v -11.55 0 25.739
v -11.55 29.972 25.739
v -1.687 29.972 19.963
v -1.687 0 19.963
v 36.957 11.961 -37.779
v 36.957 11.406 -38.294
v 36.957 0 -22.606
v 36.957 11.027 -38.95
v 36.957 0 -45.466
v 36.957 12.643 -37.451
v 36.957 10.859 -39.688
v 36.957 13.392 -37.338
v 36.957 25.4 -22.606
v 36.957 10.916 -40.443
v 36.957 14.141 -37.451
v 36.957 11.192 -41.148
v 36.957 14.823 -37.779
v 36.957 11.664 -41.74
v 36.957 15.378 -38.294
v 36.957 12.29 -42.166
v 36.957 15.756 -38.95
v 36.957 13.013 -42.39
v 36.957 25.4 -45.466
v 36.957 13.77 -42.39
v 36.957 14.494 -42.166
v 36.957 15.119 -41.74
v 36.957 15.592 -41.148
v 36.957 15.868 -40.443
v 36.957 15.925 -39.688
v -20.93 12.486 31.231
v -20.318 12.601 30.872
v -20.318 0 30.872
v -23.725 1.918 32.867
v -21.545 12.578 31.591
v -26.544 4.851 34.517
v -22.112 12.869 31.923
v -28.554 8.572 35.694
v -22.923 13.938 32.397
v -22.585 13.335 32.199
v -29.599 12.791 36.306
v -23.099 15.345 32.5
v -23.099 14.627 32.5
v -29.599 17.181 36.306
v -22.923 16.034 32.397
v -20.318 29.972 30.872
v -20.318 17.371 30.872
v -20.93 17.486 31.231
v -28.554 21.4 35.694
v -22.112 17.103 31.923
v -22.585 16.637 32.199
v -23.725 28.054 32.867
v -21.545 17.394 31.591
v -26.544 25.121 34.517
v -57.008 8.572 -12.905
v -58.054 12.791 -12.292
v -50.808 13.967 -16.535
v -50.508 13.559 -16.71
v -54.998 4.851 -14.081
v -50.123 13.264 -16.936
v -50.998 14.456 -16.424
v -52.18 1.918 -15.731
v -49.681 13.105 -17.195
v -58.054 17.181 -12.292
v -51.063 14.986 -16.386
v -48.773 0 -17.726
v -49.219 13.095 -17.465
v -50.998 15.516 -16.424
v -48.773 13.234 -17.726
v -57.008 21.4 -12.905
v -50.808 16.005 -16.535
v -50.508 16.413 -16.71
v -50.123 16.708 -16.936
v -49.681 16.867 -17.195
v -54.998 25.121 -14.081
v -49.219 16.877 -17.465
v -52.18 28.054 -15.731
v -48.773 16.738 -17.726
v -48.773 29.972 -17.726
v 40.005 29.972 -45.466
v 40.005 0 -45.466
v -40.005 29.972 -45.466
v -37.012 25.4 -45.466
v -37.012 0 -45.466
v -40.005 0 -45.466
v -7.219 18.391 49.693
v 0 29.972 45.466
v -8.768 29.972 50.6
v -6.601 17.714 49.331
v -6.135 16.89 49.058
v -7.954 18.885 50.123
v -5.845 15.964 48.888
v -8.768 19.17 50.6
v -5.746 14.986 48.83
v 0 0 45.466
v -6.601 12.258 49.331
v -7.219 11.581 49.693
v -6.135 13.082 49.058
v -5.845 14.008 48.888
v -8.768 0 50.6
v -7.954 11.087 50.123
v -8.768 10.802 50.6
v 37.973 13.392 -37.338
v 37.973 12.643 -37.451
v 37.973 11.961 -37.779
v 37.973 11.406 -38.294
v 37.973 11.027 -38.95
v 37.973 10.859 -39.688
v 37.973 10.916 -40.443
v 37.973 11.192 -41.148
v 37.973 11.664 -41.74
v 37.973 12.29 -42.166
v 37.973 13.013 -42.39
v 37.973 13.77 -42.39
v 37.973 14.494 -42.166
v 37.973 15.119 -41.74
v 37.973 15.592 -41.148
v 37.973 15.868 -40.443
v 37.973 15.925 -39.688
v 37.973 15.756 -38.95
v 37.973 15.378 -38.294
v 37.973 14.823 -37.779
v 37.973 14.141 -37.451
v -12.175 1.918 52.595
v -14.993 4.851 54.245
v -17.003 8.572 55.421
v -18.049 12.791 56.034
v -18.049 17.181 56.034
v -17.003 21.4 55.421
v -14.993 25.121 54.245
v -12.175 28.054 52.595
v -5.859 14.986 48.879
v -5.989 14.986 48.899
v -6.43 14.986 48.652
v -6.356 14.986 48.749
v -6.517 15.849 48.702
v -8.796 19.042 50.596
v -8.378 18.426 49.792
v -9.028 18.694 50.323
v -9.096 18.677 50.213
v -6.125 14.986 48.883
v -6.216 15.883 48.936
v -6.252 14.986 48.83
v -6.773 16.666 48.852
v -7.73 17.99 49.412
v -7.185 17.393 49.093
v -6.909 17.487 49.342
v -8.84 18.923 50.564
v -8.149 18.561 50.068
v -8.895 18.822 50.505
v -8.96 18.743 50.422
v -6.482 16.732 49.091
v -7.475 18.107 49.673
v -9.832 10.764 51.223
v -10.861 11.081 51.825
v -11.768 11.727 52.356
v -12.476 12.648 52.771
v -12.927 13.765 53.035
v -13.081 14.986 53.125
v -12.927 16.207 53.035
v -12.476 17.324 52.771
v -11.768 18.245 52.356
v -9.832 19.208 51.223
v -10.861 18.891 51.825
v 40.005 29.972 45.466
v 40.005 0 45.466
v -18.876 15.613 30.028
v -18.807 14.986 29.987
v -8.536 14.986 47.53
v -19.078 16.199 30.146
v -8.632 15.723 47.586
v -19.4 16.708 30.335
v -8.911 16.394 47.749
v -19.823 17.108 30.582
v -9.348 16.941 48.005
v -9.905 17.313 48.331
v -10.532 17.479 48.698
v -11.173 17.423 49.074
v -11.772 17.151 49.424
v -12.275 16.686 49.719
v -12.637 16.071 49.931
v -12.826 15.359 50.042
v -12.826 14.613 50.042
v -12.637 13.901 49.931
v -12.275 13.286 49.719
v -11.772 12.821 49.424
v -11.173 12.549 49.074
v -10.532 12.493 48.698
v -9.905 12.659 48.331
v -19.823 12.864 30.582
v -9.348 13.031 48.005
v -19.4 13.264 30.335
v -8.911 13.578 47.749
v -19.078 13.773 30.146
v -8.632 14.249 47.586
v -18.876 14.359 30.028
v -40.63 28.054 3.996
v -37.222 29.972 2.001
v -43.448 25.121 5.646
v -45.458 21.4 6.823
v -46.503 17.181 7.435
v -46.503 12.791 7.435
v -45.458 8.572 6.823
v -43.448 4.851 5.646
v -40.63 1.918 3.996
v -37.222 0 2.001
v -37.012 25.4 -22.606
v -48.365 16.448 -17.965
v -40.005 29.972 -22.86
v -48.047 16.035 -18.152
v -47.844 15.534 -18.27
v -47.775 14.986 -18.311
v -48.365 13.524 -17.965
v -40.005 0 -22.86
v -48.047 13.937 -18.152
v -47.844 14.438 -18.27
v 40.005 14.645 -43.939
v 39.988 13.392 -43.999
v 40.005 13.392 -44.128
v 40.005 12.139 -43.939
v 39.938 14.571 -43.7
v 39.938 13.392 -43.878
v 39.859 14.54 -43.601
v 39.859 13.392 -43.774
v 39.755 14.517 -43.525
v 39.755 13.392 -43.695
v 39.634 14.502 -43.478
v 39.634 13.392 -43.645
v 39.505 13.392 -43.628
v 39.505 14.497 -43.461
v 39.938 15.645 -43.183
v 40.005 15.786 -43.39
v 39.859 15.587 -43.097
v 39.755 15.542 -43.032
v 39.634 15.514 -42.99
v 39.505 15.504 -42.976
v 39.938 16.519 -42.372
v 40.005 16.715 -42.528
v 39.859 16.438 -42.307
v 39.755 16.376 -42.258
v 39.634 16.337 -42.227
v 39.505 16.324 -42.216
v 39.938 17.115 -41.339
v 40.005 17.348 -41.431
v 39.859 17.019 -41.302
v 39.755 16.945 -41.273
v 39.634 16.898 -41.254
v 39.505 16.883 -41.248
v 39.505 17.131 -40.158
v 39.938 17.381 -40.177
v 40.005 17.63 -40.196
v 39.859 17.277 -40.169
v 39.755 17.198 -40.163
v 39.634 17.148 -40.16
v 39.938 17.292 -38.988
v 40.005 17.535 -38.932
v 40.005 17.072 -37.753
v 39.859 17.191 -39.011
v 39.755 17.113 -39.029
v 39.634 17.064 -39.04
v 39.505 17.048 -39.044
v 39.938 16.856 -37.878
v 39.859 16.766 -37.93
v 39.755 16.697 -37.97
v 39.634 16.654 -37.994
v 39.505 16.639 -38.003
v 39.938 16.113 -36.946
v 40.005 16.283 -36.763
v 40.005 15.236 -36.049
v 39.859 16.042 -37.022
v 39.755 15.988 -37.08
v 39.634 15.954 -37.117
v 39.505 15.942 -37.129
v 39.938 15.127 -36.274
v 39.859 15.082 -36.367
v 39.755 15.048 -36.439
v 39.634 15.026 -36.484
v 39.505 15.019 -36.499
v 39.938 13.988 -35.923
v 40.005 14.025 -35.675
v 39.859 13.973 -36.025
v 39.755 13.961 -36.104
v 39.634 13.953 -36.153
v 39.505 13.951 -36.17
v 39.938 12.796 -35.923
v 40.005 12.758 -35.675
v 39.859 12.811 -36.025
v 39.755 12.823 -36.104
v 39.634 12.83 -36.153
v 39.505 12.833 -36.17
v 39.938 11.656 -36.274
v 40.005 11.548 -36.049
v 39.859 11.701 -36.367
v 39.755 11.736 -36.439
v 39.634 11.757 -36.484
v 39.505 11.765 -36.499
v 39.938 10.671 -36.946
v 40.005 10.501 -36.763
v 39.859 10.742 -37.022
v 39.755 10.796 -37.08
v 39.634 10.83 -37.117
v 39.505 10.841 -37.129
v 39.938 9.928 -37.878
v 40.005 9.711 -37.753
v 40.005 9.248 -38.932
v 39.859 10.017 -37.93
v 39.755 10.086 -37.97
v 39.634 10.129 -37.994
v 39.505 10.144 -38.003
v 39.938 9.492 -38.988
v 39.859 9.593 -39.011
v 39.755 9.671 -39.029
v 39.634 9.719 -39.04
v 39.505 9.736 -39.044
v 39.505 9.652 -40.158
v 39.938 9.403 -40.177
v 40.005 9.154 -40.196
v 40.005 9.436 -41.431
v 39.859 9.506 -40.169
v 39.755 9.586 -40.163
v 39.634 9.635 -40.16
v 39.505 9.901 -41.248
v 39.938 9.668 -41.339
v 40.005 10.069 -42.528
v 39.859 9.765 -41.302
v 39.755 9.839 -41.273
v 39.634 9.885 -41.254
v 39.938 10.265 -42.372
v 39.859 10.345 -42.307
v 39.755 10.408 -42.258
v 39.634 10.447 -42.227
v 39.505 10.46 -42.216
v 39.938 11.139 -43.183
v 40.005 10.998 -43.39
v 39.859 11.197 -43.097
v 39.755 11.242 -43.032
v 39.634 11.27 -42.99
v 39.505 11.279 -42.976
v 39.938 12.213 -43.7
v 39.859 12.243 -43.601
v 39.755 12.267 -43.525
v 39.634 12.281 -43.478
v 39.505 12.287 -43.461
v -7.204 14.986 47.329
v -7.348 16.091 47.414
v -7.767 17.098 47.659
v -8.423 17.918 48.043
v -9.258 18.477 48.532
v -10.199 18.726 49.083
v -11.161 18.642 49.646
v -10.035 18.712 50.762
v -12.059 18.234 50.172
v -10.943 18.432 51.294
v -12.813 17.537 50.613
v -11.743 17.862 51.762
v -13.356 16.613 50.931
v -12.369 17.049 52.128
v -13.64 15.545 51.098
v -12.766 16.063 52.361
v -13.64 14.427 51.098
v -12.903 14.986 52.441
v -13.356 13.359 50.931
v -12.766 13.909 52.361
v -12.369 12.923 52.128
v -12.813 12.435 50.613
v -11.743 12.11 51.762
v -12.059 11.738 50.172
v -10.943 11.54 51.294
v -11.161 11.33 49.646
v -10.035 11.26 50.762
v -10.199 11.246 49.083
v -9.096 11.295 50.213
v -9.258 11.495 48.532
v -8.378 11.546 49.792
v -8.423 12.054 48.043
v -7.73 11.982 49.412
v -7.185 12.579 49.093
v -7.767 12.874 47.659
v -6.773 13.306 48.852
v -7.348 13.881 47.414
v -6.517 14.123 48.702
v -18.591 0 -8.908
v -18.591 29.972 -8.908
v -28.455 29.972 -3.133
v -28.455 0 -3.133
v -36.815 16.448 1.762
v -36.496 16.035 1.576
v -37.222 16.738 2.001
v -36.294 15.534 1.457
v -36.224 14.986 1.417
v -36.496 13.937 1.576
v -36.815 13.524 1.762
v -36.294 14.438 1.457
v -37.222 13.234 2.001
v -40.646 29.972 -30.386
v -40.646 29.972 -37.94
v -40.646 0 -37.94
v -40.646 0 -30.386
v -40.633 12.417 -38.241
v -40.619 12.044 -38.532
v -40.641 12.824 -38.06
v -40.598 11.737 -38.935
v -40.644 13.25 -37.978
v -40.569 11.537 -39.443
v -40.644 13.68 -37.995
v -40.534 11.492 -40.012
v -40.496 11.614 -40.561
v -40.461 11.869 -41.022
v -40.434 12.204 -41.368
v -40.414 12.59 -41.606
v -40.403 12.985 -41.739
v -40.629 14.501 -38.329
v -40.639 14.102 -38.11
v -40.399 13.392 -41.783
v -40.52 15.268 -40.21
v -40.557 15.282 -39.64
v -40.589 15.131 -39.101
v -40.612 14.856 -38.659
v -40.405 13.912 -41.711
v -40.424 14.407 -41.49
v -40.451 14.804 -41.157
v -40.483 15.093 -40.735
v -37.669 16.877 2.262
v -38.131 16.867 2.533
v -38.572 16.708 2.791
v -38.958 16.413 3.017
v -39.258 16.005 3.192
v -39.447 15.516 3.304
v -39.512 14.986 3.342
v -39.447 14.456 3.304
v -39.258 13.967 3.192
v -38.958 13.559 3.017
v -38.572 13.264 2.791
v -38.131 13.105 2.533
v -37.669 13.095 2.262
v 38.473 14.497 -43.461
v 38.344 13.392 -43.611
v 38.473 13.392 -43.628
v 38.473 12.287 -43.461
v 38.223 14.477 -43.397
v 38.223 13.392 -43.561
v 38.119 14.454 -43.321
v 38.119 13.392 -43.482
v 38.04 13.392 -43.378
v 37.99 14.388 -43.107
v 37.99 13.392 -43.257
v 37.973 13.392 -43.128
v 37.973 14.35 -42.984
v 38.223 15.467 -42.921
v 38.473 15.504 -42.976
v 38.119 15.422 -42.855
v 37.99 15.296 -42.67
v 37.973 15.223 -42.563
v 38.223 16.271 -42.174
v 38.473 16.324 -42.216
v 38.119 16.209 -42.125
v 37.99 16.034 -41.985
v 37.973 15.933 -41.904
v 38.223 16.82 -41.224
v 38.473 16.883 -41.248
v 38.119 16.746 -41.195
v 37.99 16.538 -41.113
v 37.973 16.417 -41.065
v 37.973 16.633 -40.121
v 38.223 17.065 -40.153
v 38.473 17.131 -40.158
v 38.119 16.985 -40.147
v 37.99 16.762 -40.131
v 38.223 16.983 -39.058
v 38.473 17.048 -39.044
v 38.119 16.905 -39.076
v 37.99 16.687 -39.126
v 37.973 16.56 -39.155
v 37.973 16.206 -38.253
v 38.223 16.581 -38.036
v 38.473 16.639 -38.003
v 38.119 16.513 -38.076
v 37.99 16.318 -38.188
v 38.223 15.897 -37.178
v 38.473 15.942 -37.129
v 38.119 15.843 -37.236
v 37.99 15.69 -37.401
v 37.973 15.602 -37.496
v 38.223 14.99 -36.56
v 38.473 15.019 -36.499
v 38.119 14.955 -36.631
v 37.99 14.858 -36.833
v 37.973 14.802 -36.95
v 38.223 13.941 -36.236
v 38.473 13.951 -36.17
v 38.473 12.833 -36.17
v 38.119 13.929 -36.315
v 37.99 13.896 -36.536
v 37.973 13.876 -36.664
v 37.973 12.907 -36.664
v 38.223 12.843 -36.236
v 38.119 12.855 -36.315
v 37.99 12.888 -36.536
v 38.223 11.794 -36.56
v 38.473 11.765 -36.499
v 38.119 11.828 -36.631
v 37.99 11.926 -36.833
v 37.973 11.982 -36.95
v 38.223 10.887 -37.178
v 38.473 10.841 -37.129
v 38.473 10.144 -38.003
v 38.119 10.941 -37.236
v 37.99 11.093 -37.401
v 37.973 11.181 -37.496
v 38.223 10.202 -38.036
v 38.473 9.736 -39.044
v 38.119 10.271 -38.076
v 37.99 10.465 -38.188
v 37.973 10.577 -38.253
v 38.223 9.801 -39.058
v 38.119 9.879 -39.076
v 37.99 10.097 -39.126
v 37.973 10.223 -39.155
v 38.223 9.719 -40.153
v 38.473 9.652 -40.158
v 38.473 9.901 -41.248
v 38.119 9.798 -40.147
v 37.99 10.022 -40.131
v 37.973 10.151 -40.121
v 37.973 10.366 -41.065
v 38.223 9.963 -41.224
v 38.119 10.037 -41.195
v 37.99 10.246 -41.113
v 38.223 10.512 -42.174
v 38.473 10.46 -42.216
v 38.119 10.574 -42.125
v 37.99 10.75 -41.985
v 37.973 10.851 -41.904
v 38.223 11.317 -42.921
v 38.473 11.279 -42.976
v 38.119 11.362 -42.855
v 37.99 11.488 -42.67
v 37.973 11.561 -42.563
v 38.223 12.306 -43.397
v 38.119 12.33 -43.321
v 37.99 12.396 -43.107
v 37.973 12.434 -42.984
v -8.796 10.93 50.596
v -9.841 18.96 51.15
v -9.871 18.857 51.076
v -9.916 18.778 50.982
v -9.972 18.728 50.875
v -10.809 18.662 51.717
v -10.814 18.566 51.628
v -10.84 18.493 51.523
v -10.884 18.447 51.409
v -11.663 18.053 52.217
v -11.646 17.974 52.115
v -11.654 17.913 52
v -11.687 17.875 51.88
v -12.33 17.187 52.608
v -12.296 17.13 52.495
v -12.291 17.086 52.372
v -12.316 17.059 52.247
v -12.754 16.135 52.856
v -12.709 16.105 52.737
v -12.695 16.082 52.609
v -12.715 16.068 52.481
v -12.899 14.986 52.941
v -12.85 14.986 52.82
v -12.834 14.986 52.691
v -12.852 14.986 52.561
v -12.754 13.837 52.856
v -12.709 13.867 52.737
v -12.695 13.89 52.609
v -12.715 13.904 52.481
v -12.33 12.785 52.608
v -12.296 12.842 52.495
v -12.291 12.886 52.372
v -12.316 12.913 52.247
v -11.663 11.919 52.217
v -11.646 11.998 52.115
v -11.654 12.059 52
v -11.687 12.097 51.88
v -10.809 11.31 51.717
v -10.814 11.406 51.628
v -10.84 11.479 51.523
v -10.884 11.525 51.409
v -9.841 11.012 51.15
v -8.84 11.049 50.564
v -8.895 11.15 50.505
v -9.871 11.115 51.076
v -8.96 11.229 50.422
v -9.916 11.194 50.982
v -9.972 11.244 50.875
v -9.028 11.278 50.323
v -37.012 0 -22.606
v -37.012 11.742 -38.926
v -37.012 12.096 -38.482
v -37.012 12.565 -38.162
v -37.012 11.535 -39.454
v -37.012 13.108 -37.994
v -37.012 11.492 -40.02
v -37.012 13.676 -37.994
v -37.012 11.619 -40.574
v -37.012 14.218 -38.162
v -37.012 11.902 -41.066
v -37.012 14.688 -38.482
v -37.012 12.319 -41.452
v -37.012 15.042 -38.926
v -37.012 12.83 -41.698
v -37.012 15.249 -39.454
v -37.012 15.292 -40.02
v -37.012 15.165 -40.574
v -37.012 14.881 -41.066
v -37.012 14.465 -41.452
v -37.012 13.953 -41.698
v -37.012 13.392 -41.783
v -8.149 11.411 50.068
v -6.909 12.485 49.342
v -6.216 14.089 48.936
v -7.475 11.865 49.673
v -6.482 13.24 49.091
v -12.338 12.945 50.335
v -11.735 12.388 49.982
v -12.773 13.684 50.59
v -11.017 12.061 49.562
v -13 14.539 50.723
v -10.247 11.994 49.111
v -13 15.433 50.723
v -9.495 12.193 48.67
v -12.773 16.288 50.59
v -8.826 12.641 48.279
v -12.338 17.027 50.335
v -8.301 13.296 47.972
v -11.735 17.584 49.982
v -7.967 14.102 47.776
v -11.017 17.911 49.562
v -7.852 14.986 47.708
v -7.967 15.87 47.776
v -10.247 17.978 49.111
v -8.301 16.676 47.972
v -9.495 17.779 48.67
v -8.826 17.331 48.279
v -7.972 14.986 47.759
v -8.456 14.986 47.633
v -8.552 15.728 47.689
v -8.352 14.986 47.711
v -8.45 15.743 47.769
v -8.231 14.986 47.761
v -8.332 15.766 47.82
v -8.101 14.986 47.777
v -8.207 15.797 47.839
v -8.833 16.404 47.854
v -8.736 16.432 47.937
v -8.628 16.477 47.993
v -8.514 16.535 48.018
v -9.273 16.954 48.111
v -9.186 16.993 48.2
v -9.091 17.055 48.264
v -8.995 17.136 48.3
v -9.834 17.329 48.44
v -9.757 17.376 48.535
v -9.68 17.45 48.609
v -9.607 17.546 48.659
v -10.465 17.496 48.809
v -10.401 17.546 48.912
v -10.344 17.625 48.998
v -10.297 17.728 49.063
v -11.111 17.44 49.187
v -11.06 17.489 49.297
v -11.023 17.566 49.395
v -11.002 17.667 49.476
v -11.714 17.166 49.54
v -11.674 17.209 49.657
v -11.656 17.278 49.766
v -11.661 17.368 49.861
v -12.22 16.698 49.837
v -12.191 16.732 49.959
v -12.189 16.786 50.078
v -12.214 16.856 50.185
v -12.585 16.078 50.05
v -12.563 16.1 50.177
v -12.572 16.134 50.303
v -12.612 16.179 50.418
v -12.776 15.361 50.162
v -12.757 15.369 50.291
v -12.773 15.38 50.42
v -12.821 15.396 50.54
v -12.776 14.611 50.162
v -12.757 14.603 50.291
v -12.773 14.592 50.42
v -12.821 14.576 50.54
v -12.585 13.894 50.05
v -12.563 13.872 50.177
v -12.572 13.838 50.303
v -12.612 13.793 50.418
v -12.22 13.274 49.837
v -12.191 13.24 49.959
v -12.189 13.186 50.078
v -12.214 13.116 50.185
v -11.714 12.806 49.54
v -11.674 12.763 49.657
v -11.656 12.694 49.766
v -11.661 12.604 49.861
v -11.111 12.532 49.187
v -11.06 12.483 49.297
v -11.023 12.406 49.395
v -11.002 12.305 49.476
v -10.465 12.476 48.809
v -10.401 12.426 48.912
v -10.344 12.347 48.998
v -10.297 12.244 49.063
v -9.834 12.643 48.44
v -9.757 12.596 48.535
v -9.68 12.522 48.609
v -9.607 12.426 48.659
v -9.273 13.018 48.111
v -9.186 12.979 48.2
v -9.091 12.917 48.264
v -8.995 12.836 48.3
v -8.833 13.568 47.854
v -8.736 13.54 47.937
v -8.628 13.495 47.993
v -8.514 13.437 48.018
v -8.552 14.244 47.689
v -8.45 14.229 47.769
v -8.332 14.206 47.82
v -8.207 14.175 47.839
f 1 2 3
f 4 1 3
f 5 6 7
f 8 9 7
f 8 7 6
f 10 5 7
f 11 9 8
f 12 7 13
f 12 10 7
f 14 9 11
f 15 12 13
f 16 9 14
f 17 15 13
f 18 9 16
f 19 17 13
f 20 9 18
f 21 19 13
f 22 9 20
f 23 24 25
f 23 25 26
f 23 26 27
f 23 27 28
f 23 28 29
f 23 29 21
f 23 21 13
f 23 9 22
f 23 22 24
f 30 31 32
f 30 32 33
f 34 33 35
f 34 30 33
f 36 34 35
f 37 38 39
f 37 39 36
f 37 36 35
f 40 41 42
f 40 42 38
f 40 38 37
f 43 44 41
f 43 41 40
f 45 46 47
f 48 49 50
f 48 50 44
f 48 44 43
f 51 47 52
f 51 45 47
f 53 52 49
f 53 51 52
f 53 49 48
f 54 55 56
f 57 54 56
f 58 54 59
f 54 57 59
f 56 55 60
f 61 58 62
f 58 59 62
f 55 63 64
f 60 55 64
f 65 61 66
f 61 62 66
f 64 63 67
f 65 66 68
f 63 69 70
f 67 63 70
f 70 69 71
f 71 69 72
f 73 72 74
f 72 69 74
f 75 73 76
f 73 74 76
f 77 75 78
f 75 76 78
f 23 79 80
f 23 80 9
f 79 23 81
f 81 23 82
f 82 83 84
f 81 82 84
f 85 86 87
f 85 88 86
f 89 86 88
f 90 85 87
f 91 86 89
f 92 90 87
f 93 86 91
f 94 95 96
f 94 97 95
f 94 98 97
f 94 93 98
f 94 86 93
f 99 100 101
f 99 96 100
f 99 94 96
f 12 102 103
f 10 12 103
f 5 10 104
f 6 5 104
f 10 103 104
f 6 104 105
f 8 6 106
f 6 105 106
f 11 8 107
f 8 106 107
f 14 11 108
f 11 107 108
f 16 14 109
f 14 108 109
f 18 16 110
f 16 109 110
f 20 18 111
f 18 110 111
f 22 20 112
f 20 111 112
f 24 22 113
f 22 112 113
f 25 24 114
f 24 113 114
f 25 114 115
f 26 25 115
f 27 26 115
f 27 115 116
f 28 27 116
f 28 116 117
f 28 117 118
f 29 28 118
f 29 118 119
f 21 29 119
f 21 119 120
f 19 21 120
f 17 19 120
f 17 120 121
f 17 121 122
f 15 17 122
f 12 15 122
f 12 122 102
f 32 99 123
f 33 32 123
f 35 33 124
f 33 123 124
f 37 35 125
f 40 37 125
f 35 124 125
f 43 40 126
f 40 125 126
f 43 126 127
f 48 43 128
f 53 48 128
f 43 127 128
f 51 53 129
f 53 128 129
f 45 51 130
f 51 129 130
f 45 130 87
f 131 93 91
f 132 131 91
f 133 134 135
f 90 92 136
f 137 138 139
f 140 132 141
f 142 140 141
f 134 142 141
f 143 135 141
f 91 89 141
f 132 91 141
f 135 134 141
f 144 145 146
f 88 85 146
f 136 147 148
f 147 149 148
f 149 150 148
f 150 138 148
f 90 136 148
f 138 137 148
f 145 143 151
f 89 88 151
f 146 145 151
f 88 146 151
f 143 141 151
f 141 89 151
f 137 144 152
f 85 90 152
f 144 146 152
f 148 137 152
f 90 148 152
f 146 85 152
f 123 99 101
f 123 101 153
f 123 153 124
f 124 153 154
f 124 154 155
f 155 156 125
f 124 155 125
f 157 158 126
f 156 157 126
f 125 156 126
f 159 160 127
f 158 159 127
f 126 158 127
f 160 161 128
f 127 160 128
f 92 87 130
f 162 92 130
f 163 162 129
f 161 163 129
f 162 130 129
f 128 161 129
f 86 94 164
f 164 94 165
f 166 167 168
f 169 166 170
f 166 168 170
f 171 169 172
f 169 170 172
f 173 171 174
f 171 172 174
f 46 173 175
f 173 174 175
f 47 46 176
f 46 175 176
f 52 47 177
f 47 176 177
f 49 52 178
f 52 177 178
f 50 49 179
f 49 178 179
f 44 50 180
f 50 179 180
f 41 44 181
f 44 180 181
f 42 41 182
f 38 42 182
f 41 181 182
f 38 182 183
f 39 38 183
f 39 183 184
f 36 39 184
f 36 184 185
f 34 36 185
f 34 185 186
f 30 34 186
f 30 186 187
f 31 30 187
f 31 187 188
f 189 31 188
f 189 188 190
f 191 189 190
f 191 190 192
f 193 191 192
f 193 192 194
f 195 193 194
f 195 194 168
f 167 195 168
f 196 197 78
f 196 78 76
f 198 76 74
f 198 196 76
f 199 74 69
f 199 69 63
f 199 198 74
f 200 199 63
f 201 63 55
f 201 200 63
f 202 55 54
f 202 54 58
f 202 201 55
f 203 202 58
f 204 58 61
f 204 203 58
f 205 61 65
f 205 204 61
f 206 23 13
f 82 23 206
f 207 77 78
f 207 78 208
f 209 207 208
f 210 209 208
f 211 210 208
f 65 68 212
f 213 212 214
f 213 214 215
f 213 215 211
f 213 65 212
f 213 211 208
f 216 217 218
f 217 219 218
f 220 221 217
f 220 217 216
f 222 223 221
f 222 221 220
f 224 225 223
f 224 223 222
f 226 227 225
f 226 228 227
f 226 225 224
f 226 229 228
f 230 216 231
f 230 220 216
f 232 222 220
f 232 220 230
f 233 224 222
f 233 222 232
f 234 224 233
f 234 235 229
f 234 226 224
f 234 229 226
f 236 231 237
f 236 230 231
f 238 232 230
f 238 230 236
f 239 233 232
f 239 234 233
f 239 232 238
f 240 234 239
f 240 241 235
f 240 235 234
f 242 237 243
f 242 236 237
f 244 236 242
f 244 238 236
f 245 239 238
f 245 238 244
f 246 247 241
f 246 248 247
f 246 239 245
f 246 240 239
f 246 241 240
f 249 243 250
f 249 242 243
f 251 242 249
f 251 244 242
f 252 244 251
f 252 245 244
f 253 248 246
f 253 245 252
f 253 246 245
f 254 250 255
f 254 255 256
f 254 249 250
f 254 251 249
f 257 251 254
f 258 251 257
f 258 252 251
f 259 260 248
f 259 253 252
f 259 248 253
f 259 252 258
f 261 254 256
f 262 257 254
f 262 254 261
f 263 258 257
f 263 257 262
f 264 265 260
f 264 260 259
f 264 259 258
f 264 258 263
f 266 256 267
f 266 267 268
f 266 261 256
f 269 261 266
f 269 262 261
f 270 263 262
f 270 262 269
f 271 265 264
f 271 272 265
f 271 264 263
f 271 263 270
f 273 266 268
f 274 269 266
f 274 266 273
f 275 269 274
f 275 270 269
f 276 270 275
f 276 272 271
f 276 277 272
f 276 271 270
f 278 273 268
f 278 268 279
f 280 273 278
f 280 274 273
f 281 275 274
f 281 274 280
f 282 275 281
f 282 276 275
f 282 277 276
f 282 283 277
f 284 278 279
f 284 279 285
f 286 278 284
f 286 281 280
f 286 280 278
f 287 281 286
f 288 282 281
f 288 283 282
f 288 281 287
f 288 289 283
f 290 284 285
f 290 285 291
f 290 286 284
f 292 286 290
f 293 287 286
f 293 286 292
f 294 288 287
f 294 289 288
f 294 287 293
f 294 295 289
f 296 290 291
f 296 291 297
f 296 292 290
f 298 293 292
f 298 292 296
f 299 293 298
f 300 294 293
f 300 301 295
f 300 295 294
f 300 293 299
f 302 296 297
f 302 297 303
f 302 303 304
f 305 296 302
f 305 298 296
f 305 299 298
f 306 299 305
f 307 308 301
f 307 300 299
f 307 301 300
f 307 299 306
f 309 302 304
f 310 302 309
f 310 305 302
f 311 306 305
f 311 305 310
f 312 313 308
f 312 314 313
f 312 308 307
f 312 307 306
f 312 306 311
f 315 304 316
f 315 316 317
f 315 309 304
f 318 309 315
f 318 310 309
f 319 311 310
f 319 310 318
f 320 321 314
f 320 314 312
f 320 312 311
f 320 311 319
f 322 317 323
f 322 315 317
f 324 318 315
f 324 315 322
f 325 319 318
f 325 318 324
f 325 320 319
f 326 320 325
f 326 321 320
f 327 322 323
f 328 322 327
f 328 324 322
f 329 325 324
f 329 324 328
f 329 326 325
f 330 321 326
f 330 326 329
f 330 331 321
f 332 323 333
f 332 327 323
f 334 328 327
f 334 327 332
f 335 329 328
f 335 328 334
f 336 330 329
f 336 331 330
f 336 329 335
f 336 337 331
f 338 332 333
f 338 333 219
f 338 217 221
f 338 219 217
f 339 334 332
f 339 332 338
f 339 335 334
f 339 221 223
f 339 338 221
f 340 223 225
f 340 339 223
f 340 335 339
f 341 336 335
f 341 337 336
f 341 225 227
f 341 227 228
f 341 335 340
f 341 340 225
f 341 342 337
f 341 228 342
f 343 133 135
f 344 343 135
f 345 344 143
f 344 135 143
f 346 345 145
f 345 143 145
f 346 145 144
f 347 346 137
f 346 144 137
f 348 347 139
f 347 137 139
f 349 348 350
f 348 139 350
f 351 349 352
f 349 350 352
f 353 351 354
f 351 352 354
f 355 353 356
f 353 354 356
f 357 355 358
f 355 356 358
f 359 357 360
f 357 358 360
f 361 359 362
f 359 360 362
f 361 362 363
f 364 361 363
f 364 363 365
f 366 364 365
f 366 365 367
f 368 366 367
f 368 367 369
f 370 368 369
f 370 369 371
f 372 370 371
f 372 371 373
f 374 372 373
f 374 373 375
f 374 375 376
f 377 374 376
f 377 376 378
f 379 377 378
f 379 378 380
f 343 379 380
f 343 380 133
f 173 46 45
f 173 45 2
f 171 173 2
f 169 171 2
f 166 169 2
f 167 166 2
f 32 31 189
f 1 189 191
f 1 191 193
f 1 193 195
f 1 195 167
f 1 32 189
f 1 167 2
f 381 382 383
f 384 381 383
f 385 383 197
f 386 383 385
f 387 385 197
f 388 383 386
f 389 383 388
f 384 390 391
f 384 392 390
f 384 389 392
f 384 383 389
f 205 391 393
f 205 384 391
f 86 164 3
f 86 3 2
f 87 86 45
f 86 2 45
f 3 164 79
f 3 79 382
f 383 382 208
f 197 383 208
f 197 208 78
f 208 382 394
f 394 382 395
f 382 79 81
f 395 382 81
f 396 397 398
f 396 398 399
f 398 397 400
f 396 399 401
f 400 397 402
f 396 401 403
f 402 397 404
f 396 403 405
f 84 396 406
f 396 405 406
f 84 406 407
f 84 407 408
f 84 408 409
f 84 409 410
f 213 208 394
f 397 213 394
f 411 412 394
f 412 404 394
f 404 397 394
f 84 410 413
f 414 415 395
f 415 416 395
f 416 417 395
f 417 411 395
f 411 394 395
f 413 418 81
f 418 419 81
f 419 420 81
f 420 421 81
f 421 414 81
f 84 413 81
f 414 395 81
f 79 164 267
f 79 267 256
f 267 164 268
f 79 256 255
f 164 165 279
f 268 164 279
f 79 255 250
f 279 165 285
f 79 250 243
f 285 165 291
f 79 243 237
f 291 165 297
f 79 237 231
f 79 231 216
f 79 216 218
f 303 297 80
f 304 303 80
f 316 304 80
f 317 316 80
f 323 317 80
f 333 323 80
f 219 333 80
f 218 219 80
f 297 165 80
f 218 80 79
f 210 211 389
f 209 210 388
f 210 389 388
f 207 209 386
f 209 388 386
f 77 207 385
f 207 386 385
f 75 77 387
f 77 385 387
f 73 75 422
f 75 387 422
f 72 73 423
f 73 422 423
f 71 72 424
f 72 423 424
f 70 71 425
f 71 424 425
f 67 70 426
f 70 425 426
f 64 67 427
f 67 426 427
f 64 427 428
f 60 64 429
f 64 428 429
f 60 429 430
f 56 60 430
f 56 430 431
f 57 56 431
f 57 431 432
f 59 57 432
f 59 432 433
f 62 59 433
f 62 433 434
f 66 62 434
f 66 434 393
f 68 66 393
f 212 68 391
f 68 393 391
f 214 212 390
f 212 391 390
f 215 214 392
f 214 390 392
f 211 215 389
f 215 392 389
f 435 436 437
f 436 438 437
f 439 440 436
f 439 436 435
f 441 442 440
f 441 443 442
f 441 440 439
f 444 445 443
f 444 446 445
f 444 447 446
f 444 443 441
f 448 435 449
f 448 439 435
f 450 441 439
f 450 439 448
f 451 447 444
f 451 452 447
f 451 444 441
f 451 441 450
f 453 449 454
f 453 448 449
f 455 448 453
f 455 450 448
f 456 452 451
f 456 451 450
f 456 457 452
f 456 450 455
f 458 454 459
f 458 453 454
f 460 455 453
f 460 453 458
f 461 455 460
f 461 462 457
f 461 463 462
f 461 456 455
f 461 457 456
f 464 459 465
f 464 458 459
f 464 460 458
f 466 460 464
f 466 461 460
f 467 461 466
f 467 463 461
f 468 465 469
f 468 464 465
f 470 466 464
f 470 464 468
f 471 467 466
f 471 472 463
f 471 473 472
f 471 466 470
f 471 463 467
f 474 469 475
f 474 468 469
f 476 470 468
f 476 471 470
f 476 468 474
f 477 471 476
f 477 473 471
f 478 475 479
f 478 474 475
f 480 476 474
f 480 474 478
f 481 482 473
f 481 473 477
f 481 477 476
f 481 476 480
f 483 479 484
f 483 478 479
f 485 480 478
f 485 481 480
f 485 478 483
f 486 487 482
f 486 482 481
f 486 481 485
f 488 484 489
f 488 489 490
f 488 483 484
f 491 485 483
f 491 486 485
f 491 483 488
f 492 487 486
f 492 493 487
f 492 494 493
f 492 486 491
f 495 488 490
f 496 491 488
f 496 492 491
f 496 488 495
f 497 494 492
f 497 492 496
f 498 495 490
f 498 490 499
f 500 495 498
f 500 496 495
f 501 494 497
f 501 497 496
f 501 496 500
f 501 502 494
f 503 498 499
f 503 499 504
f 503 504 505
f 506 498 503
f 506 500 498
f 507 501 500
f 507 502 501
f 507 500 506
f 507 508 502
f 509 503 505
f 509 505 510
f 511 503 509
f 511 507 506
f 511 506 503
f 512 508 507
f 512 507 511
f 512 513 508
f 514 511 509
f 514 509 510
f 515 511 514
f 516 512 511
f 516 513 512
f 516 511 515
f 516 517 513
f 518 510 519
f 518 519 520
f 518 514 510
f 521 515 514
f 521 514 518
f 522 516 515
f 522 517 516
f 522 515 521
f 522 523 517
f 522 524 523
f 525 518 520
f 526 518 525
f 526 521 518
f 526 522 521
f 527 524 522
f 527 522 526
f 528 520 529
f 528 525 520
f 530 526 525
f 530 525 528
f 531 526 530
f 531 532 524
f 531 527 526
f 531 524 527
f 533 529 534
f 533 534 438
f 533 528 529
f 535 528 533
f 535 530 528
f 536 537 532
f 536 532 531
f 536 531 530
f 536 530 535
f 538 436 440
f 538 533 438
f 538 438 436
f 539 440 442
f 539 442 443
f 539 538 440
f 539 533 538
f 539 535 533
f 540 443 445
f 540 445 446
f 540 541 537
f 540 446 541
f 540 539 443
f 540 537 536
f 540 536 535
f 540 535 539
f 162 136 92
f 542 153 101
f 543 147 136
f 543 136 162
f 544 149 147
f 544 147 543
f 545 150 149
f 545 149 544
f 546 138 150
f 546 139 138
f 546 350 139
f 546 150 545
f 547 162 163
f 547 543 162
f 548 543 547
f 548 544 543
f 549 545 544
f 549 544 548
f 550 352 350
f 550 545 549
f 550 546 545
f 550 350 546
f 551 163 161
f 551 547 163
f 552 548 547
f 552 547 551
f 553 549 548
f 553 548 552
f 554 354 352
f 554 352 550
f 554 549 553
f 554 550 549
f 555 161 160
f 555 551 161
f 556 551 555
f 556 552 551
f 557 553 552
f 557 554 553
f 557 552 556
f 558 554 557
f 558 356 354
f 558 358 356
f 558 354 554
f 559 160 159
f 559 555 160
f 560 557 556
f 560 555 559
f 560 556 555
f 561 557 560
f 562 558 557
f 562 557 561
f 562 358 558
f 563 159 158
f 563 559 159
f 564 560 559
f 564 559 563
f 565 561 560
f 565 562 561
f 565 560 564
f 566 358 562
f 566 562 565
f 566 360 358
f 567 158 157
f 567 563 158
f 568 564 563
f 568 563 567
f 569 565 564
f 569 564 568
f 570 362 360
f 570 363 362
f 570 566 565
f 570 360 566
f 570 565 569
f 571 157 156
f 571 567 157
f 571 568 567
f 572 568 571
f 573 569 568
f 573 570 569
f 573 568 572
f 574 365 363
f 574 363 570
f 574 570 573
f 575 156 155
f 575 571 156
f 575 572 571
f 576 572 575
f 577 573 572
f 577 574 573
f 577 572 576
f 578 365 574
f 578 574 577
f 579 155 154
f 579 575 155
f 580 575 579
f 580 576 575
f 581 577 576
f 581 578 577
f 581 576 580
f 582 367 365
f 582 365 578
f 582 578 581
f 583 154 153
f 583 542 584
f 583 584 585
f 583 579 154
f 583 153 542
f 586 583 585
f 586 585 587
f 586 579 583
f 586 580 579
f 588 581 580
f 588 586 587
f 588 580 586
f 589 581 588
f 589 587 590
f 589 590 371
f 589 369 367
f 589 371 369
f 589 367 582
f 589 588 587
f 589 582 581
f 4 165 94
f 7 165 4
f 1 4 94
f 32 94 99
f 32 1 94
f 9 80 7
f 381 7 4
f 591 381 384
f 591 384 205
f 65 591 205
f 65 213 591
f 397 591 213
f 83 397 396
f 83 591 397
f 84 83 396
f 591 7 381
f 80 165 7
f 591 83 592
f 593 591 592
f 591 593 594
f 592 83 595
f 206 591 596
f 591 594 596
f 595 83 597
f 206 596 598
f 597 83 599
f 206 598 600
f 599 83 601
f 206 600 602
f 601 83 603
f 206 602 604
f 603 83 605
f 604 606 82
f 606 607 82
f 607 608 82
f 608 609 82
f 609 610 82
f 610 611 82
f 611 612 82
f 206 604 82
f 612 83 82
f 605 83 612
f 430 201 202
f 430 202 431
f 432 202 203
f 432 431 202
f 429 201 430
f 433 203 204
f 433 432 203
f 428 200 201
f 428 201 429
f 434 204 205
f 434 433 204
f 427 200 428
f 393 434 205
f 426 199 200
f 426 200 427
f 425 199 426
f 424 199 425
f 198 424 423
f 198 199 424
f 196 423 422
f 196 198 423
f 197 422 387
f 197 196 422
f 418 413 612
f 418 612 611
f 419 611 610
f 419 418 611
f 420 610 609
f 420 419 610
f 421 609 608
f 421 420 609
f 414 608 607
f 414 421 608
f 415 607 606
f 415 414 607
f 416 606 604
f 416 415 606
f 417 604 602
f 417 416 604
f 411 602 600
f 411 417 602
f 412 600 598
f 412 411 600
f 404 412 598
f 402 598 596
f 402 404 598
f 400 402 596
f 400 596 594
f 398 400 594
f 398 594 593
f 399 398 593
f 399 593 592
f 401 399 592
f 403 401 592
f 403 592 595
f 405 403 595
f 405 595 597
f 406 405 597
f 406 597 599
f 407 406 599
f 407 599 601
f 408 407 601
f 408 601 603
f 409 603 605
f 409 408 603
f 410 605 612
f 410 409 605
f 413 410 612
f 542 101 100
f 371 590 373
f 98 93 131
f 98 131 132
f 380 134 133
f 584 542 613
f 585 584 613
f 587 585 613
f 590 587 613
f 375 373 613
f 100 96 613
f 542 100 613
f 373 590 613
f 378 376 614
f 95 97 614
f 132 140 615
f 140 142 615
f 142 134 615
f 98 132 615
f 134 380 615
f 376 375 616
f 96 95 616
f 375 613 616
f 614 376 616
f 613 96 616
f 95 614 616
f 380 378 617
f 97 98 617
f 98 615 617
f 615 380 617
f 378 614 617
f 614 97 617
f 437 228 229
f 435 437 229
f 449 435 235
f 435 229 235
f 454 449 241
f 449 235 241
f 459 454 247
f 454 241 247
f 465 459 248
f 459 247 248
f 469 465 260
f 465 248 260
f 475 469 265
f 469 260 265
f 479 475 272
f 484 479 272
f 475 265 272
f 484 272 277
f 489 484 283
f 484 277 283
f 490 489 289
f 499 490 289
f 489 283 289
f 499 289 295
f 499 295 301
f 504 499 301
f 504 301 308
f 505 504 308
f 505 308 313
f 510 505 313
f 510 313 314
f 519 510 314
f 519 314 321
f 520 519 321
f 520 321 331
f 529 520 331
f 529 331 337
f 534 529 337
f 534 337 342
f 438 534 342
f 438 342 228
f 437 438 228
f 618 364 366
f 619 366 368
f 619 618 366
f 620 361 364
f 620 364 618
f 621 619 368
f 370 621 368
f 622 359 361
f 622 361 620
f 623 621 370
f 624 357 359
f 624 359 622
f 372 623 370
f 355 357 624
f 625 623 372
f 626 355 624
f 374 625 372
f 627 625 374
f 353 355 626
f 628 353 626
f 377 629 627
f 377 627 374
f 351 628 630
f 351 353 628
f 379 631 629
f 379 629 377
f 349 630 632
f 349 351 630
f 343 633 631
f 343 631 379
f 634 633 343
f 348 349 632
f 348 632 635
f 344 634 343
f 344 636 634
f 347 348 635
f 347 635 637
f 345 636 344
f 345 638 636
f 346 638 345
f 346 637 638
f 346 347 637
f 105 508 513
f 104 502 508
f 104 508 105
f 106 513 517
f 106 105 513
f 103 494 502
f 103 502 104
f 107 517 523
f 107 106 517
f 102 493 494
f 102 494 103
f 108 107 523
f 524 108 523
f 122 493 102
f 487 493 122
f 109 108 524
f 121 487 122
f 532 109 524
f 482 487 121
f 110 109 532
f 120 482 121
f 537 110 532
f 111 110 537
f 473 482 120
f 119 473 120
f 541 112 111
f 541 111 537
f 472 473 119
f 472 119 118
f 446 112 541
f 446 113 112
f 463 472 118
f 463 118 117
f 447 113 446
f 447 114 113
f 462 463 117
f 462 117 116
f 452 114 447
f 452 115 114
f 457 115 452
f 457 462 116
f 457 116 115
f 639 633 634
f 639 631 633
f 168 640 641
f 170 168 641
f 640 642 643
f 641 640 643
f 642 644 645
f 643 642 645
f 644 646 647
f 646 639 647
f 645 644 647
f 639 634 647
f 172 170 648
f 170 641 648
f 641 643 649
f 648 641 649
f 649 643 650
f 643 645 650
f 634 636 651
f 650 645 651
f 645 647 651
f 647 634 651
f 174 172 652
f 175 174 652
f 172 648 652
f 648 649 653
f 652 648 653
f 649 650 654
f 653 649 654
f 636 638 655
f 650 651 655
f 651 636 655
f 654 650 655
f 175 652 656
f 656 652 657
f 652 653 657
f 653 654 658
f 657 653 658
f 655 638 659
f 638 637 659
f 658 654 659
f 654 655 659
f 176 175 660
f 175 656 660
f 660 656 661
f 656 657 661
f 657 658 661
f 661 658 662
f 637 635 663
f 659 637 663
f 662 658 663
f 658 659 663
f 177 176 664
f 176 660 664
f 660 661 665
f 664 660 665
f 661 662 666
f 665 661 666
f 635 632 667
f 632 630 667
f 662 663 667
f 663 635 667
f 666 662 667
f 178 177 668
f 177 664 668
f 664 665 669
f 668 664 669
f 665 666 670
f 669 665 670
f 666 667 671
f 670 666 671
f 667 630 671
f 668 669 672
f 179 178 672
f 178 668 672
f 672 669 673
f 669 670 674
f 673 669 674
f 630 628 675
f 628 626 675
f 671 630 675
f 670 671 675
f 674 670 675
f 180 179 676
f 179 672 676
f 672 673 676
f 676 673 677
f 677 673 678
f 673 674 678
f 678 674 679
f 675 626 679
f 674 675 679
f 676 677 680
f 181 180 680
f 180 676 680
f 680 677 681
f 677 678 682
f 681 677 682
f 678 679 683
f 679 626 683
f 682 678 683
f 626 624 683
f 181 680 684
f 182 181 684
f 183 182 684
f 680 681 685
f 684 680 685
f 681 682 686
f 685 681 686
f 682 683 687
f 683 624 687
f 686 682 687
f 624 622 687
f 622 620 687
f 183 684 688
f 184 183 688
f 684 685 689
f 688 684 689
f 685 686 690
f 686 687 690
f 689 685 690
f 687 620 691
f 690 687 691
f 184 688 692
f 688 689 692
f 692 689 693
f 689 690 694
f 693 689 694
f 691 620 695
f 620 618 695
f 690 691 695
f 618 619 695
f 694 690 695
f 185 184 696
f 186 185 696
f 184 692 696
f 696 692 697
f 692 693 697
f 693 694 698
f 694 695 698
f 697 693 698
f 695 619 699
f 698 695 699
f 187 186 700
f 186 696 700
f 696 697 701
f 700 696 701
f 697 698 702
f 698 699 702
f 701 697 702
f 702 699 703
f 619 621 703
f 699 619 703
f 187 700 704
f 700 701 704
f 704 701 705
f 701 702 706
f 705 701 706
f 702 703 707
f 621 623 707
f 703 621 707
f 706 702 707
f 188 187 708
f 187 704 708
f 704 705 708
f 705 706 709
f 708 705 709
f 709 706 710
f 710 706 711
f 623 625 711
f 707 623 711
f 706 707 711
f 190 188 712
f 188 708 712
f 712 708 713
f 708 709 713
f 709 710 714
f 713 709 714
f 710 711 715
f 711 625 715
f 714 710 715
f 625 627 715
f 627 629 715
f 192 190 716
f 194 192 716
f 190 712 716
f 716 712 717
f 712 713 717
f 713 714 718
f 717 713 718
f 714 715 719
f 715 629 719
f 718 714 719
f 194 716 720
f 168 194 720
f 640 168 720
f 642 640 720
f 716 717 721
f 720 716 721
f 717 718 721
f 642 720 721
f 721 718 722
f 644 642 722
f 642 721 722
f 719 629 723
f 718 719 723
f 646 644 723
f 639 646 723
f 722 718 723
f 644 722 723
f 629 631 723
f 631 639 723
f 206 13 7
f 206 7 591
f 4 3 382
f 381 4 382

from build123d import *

# Parameters (mm, degrees)
BOSS_EXTRUDE2_DEPTH                             = 29.972
EXTRUDE_THIN2_DEPTH                             = 29.972
BOSS_EXTRUDE3_DEPTH                             = 22.86
BOSS_EXTRUDE4_DEPTH                             = 22.86
SKETCH12_R                                      = 1.905
CUT_EXTRUDE2_DEPTH                              = 111.410659875
BOSS_EXTRUDE6_DEPTH                             = 29.972
CBORE_FOR_6_PAN_HEAD_MACHINE_SCREW1_D           = 3.7500052
CBORE_FOR_6_PAN_HEAD_MACHINE_SCREW1_CBORE_D     = 7.5000104
CBORE_FOR_6_PAN_HEAD_MACHINE_SCREW1_CBORE_DEPTH = 2.032
CUT_EXTRUDE4_REACH                              = 107.839
SKETCH18_R                                      = 2.5
FILLET1_R                                       = 0.5
SKETCH19_W                                      = 73.969126852
SKETCH19_H                                      = 25.4
CUT_EXTRUDE5_DEPTH                              = 22.86
CUT_EXTRUDE7_START                              = -80.649491
SKETCH21_R                                      = 1.905
CUT_EXTRUDE7_DEPTH                              = 80.649491
CBORE_FOR_6_PAN_HEAD_MACHINE_SCREW2_D           = 3.7500052
CBORE_FOR_6_PAN_HEAD_MACHINE_SCREW2_CBORE_D     = 7.5000104
CBORE_FOR_6_PAN_HEAD_MACHINE_SCREW2_CBORE_DEPTH = 2.032
SKETCH26_R                                      = 2.54
CUT_EXTRUDE9_DEPTH                              = 3.048
FILLET3_R                                       = 0.5
CUT_EXTRUDE11_DEPTH                             = 29.972


with BuildPart() as part:
    # Sketch1 → Boss-Extrude2 (new body)
    with BuildSketch(Plane(origin=(0, 0, 0), x_dir=(1, 0, 0), z_dir=(0, 1, 0))):
        Polygon((-40.005, 45.466), (-40.005, 22.86), (0, -45.466), (40.005, -45.466), (40.005, 45.466), align=None)
    extrude(amount=BOSS_EXTRUDE2_DEPTH)

    # Sketch8 → Extrude-Thin2 (add)
    with BuildSketch(Plane(origin=(0, 0, 0), x_dir=(1, 0, 0), z_dir=(0, 1, 0))):
        Polygon((-40.005, 22.86), (-28.454605215, 3.132659066), (-37.222312297, -2.000849727), (-48.772707082, 17.726491207), align=None)
        Polygon((-11.550394785, -25.738659066), (0, -45.466), (-8.767707082, -50.599508793), (-20.318101866, -30.872167859), align=None)
    extrude(amount=EXTRUDE_THIN2_DEPTH)

    # Sketch10 → Boss-Extrude3 (add)
    with BuildSketch(Plane(origin=(19.824382752, 0, 33.85878705), x_dir=(0.862963295, 0, -0.505266614), z_dir=(0.505266614, 0, 0.862963295))):
        with BuildLine():
            Line((-33.132451849, 29.972), (-33.132451849, 0))
            ThreePointArc((-33.132451849, 0), (-44.041101893, 14.986), (-33.132451849, 29.972))
        make_face()
    extrude(amount=-BOSS_EXTRUDE3_DEPTH)

    # Sketch11 → Boss-Extrude4 (add)
    with BuildSketch(Plane(origin=(-8.630222463, 0, -14.739872016), x_dir=(0.862963295, 0, -0.505266614), z_dir=(0.505266614, 0, 0.862963295))):
        with BuildLine():
            Line((-33.132451849, 0), (-33.132451849, 29.972))
            ThreePointArc((-33.132451849, 29.972), (-44.041101893, 14.986), (-33.132451849, 0))
        make_face()
    extrude(amount=-BOSS_EXTRUDE4_DEPTH)

    # Sketch12 → Cut-Extrude2 (cut, through all)
    with BuildSketch(Plane(origin=(21.107759951, 0, 36.050713821), x_dir=(0.862963295, 0, -0.505266614), z_dir=(0.505266614, 0, 0.862963295))):
        with Locations((-33.881101893, 14.986)):
            Circle(SKETCH12_R)
    extrude(amount=-CUT_EXTRUDE2_DEPTH, mode=Mode.SUBTRACT)

    # Sketch15 → Boss-Extrude6 (add)
    with BuildSketch(Plane(origin=(0, 29.972, 0), x_dir=(1, 0, 0), z_dir=(0, 1, 0))):
        with BuildLine():
            Line((-40.005, 45.466), (-40.005, 22.86))
            ThreePointArc((-40.005, 22.86), (-40.726132774, 34.163), (-40.005, 45.466))
        make_face()
    extrude(amount=-BOSS_EXTRUDE6_DEPTH)

    # CBORE for #6 Pan Head Machine Screw1 (through all)
    with Locations(Plane(origin=(19.824382752, 0, 33.85878705), x_dir=(0.862963295, 0, -0.505266614), z_dir=(0.505266614, 0, 0.862963295))):
        with Locations((-33.881101893, 14.986)):
            CounterBoreHole(CBORE_FOR_6_PAN_HEAD_MACHINE_SCREW1_D / 2, CBORE_FOR_6_PAN_HEAD_MACHINE_SCREW1_CBORE_D / 2, CBORE_FOR_6_PAN_HEAD_MACHINE_SCREW1_CBORE_DEPTH)

    # Sketch18 → Cut-Extrude4 (cut, up to next)
    with BuildSketch(Plane(origin=(18.797680994, 0, 32.105245634), x_dir=(0.862963295, 0, -0.505266614), z_dir=(0.505266614, 0, 0.862963295)), mode=Mode.PRIVATE) as cut_extrude4_sk1:
        with Locations((-33.881101893, 14.986)):
            Circle(SKETCH18_R)
    cut_extrude4_tool1 = extrude(cut_extrude4_sk1.sketch, amount=-CUT_EXTRUDE4_REACH, mode=Mode.PRIVATE) & part.part
    add(cut_extrude4_tool1.solids().sort_by_distance((-10.440466, 14.986, 49.224235))[0], mode=Mode.SUBTRACT)

    # Fillet1
    fillet1_edges = [part.edges().sort_by_distance(p)[0] for p in [
        (-12.649881436, 14.986, 52.872529093),
        (-12.597874588, 14.986, 50.487401783),
    ]]
    fillet(fillet1_edges, radius=FILLET1_R)

    # Sketch19 → Cut-Extrude5 (cut)
    with BuildSketch(Plane(origin=(0, 0, -45.466), x_dir=(-1, 0, 0), z_dir=(0, 0, -1))):
        with Locations((0.027563426, 12.7)):
            Rectangle(SKETCH19_W, SKETCH19_H)
    extrude(amount=-CUT_EXTRUDE5_DEPTH, mode=Mode.SUBTRACT)

    # Sketch21 → Cut-Extrude7 (cut)
    with BuildSketch(Plane(origin=(40.005, 0, 0), x_dir=(0, 0, -1), z_dir=(1, 0, 0)).offset(CUT_EXTRUDE7_START)):
        with Locations((39.878, 13.391837379)):
            Circle(SKETCH21_R)
    extrude(amount=CUT_EXTRUDE7_DEPTH, mode=Mode.SUBTRACT)

    # CBORE for #6 Pan Head Machine Screw2 (through all)
    with Locations(Plane(origin=(40.005, 0, 0), x_dir=(0, 0, -1), z_dir=(1, 0, 0))):
        with Locations((39.878, 13.391837379)):
            CounterBoreHole(CBORE_FOR_6_PAN_HEAD_MACHINE_SCREW2_D / 2, CBORE_FOR_6_PAN_HEAD_MACHINE_SCREW2_CBORE_D / 2, CBORE_FOR_6_PAN_HEAD_MACHINE_SCREW2_CBORE_DEPTH)

    # Sketch26 → Cut-Extrude9 (cut)
    with BuildSketch(Plane(origin=(40.005, 0, 0), x_dir=(0, 0, -1), z_dir=(1, 0, 0))):
        with Locations(Location((39.878, 13.391837379, 0), (0, 0, 180))):  # turned: the seam where the file's is
            Circle(SKETCH26_R)
    extrude(amount=-CUT_EXTRUDE9_DEPTH, mode=Mode.SUBTRACT)

    # Fillet3
    fillet3_edges = [part.edges().sort_by_distance(p)[0] for p in [
        (40.005, 13.391837379, -36.1279948),
        (37.973, 13.391837379, -36.1279948),
    ]]
    fillet(fillet3_edges, radius=FILLET3_R)

    # Sketch28 → Cut-Extrude11 (cut)
    with BuildSketch(Plane(origin=(0, 29.972, 0), x_dir=(1, 0, 0), z_dir=(0, 1, 0))):
        Polygon((-11.550394785, -25.738659066), (-1.686724318, -19.963461674), (-18.590934748, 8.907856459), (-28.454605215, 3.132659066), align=None)
    extrude(amount=-CUT_EXTRUDE11_DEPTH, mode=Mode.SUBTRACT)


solid = part.part
